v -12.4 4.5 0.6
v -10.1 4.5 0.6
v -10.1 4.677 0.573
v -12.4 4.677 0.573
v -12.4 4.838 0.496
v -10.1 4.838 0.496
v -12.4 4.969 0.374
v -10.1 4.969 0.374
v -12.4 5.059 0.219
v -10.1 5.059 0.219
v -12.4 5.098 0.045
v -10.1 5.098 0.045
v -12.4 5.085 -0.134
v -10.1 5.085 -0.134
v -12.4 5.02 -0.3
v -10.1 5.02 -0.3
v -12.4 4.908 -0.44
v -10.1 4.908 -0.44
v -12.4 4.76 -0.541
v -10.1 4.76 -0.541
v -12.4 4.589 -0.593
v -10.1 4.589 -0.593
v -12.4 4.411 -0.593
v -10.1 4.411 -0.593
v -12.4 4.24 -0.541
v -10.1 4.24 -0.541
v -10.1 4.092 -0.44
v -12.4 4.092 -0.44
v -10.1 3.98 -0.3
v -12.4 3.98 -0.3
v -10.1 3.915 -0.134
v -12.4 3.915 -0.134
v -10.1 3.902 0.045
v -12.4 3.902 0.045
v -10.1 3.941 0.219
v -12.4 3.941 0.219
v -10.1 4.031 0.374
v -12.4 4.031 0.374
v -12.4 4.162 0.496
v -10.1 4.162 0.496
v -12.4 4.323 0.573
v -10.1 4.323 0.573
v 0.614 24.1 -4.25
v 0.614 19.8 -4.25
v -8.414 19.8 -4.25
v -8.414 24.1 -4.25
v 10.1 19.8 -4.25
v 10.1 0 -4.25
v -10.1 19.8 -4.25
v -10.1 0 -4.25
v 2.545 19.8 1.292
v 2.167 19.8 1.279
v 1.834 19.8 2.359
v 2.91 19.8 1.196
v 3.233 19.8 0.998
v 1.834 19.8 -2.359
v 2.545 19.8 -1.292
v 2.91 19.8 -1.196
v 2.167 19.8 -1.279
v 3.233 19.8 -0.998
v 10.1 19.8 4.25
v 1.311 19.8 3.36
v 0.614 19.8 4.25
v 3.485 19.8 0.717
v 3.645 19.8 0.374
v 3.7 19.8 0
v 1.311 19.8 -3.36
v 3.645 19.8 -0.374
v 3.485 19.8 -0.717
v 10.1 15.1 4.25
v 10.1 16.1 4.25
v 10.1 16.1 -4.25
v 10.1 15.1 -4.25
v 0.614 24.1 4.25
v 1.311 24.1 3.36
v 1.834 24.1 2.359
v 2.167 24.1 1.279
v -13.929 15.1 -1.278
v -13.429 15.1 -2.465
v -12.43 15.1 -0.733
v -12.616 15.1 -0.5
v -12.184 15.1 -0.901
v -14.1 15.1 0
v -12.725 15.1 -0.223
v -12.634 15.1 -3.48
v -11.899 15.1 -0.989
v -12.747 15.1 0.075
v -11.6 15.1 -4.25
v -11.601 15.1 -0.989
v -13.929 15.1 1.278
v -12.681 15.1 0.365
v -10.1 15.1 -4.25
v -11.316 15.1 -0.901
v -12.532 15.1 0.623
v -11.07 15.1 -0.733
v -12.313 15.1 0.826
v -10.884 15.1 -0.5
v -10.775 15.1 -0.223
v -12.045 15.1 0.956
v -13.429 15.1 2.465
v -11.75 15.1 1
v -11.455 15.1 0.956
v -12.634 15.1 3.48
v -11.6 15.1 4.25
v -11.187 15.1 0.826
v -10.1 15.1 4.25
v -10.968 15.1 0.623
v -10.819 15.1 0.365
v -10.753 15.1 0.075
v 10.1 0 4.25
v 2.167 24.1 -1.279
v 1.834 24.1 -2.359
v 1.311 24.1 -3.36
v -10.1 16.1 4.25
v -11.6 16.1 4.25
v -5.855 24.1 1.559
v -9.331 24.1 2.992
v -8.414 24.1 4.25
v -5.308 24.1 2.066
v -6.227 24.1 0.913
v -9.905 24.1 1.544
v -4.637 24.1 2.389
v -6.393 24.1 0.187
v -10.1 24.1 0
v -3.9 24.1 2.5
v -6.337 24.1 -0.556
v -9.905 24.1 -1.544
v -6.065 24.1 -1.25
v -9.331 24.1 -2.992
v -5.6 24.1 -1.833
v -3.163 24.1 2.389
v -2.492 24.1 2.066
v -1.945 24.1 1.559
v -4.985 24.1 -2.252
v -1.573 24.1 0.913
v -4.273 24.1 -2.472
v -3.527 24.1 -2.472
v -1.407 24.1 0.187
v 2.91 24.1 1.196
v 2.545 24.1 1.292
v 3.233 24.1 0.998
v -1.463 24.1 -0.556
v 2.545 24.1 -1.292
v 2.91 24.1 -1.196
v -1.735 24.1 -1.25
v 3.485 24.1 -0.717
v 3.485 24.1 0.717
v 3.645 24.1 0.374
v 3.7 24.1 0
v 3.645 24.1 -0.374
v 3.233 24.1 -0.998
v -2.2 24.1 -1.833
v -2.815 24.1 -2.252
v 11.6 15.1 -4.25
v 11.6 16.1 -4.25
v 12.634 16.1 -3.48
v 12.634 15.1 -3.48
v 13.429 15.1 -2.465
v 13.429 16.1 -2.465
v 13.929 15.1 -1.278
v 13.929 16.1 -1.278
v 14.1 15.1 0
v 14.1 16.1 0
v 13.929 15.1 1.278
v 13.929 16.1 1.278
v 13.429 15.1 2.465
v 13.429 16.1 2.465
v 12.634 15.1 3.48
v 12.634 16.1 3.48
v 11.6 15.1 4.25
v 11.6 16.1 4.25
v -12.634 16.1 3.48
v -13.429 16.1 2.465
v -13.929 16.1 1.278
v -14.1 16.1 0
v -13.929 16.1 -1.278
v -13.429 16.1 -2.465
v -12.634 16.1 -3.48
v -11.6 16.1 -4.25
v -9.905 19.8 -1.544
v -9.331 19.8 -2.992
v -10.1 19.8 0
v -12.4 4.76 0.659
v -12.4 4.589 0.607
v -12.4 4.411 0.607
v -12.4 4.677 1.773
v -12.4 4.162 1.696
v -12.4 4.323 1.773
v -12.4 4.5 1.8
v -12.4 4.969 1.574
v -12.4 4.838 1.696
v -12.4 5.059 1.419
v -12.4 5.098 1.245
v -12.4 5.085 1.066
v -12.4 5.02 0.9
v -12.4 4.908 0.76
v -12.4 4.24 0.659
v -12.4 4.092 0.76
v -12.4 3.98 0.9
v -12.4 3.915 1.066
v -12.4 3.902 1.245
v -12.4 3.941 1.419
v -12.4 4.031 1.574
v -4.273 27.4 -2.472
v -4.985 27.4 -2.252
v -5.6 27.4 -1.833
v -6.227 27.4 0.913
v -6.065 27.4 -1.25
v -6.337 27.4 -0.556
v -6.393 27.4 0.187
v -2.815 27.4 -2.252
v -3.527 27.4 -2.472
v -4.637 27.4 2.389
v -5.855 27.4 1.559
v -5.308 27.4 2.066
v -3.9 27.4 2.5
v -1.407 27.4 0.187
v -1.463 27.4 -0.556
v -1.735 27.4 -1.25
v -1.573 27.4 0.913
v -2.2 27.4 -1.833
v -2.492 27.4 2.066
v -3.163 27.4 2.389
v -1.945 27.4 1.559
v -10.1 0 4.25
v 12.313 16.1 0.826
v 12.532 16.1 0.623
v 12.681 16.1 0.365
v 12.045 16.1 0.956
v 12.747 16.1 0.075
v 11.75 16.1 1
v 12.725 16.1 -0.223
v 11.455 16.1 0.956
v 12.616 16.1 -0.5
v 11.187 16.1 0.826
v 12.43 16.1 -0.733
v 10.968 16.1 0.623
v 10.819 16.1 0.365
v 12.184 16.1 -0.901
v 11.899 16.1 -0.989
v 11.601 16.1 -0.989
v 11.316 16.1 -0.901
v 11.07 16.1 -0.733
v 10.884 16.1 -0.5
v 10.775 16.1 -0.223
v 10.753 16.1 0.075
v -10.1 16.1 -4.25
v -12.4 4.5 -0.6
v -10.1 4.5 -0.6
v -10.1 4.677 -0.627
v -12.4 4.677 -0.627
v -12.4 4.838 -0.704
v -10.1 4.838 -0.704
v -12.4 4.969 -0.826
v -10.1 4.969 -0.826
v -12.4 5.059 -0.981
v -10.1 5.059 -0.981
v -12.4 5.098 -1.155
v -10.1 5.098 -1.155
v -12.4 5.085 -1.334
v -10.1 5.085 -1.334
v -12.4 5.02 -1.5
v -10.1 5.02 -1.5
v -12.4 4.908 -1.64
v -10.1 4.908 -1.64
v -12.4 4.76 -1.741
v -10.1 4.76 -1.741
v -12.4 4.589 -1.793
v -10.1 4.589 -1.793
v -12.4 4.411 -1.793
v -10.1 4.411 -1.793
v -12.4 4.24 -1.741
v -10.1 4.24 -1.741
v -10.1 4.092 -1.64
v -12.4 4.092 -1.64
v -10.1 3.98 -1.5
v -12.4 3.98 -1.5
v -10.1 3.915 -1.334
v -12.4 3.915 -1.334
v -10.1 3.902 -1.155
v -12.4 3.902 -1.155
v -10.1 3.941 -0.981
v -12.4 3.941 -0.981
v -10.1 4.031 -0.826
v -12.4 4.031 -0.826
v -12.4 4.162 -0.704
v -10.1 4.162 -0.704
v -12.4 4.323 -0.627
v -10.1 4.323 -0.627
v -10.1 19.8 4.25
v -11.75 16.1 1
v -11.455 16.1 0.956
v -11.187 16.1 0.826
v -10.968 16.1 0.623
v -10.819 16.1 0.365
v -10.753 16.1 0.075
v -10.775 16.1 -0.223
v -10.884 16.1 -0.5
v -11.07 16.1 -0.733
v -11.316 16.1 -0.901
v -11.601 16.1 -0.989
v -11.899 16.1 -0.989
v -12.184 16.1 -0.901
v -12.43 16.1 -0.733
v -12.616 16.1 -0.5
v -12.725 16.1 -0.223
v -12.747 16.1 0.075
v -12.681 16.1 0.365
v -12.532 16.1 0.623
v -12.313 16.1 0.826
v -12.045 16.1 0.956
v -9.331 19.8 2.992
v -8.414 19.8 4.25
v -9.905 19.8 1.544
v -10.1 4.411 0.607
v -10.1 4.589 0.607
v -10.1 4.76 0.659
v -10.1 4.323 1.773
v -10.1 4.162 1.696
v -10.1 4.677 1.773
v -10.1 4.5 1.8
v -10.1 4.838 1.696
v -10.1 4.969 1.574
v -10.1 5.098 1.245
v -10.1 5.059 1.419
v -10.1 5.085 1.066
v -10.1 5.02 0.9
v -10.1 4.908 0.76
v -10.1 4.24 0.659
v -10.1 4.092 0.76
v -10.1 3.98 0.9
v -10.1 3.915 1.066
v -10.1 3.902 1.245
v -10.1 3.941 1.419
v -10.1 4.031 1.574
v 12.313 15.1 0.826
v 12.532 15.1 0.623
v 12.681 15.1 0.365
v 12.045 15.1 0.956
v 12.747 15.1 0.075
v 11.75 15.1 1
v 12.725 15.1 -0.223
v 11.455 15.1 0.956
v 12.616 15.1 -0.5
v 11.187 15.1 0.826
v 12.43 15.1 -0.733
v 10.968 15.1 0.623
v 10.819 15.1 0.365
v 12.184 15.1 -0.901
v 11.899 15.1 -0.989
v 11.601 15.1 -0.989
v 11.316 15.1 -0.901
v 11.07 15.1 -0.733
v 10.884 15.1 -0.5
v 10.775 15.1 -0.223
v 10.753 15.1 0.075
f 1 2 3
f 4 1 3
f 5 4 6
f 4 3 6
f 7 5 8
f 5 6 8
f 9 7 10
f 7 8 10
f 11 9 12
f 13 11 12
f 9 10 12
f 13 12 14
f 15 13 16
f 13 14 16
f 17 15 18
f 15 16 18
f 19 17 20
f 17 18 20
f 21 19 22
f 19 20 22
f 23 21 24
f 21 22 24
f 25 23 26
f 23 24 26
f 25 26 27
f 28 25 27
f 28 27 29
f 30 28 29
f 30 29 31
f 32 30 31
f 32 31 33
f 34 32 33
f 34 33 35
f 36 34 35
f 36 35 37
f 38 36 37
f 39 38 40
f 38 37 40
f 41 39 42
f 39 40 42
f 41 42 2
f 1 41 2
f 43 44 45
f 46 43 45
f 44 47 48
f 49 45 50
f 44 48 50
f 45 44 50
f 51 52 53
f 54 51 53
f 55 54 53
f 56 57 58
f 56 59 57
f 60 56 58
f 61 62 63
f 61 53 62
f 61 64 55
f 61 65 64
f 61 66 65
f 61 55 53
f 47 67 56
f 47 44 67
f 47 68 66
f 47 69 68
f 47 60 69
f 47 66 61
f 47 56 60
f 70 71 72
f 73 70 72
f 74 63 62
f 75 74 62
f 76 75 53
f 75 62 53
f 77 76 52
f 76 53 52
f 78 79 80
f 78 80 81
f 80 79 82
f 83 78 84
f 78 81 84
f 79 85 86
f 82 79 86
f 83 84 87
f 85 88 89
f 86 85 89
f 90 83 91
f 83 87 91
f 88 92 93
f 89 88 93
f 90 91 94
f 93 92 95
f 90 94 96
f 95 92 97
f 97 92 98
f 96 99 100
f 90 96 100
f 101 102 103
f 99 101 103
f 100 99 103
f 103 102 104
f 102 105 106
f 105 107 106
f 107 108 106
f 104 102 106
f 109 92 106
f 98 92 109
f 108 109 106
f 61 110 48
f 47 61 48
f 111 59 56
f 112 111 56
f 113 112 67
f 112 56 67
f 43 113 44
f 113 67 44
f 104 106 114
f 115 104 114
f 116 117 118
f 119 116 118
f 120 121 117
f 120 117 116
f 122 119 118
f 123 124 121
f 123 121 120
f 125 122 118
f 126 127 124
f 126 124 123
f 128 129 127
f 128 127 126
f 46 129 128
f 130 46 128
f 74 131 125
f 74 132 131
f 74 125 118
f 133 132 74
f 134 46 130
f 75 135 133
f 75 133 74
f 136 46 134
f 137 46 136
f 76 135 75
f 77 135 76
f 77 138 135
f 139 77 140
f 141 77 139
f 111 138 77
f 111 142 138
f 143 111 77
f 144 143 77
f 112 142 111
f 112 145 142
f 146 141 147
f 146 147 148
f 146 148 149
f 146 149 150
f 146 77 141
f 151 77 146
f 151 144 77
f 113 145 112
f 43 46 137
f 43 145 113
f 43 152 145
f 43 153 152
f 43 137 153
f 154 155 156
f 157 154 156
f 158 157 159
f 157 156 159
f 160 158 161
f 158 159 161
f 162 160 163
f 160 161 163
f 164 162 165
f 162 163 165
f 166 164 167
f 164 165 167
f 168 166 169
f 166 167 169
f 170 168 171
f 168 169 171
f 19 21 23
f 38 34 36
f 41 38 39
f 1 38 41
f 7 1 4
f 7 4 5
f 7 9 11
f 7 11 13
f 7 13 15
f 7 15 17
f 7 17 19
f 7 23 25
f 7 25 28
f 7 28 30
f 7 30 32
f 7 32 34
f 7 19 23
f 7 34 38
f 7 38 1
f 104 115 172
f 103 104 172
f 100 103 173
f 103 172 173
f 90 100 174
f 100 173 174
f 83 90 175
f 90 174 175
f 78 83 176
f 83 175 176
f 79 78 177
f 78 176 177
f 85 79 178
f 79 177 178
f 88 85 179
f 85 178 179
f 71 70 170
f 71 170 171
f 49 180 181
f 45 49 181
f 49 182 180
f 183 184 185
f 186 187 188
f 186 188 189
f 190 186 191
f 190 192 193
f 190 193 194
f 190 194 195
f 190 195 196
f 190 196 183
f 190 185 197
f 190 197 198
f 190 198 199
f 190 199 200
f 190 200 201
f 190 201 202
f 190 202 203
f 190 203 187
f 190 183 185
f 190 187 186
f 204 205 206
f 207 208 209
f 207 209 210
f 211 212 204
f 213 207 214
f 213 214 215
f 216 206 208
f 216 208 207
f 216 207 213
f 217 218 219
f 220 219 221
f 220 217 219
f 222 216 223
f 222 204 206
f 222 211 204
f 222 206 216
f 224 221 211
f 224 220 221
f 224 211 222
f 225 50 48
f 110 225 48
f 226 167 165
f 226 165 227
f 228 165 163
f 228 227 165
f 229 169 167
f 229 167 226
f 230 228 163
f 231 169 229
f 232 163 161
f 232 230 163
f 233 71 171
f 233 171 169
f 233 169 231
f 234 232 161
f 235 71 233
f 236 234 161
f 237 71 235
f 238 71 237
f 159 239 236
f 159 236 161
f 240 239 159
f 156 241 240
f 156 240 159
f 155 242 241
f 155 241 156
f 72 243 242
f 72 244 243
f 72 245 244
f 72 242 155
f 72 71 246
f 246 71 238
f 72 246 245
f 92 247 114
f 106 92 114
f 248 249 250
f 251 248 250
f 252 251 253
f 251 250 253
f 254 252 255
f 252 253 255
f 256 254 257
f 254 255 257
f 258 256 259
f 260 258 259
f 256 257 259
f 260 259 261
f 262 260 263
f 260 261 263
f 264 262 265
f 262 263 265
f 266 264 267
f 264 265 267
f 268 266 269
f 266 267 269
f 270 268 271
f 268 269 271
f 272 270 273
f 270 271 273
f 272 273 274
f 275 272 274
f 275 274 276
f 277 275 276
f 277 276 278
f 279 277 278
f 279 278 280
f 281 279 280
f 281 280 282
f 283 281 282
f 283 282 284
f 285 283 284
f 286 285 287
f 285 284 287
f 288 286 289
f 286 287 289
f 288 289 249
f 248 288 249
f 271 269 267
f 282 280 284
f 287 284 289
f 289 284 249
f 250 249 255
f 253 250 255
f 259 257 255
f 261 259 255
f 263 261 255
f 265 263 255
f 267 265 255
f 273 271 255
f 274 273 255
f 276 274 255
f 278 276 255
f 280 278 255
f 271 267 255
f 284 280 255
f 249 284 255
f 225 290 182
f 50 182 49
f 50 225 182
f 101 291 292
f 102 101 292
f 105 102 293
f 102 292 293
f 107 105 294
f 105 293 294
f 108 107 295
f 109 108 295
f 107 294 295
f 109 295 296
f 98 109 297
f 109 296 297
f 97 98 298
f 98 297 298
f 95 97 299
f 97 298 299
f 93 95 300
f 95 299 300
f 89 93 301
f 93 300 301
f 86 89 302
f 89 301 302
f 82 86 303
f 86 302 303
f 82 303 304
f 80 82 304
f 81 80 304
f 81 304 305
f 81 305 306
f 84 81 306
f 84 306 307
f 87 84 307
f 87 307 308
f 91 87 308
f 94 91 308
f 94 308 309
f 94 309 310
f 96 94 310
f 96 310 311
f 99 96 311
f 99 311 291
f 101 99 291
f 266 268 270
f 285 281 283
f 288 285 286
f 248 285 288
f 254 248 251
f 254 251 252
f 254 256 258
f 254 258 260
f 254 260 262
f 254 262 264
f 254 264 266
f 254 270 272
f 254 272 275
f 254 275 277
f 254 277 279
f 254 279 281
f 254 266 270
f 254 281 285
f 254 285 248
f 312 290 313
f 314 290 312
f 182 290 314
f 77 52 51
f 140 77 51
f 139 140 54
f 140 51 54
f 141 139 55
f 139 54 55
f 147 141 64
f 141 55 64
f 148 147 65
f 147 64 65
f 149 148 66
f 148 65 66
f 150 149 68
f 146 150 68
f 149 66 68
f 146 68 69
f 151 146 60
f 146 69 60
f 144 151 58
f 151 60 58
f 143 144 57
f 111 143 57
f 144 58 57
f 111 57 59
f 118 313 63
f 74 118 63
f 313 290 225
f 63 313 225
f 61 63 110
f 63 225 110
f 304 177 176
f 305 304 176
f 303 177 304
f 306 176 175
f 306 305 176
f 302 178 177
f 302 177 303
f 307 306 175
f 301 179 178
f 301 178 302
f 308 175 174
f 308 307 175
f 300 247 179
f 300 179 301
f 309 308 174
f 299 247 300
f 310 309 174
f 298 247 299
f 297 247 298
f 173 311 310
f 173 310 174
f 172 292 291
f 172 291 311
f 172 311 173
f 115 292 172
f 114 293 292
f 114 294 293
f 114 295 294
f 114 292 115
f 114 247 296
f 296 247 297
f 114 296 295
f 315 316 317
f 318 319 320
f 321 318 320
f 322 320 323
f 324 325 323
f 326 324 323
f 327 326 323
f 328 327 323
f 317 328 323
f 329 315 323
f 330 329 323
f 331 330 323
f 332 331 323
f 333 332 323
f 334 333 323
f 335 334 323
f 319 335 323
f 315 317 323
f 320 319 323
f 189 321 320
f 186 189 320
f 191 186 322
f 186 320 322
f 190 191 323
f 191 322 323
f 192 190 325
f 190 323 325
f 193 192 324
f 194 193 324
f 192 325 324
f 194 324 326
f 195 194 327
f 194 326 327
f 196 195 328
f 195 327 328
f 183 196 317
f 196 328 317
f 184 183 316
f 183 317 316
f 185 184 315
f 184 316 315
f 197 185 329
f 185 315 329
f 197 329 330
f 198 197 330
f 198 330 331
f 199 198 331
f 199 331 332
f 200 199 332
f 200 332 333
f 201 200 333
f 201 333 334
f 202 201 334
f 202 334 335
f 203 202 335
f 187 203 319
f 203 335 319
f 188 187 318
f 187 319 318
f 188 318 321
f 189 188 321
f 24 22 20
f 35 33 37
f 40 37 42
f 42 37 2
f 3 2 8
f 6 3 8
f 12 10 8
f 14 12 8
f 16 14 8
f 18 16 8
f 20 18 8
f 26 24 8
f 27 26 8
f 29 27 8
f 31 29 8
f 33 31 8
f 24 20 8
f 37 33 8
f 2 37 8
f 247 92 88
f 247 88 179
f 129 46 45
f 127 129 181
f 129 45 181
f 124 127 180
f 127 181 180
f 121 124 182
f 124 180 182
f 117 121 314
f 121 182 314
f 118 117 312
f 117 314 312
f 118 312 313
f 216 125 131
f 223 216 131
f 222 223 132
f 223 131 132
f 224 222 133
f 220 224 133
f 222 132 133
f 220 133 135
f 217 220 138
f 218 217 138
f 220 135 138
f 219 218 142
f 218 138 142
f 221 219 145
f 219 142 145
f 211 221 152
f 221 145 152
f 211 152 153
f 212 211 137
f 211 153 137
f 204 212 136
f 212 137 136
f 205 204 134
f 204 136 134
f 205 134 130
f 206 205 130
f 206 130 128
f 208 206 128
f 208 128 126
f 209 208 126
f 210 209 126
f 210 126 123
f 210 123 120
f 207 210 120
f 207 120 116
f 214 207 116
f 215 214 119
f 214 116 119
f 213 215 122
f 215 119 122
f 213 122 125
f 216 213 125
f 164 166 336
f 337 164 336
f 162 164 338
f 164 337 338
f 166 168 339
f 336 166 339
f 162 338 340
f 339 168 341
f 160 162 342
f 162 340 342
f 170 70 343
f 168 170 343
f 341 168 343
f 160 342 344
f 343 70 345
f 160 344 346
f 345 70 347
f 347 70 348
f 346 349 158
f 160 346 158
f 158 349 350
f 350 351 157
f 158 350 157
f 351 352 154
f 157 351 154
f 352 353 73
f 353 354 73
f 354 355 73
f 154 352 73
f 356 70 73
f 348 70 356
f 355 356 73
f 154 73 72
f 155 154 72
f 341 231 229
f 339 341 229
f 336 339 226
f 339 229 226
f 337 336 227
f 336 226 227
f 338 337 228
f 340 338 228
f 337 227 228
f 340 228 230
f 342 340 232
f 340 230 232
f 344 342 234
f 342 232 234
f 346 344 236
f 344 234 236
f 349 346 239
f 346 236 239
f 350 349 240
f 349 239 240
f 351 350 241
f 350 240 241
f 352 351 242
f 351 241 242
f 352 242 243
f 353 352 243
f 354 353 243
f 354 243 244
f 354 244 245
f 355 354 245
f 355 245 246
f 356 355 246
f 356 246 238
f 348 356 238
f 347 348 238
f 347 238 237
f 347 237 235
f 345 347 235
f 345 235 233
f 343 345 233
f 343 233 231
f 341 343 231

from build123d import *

# Parameters (mm, degrees)
SKETCH1_W                  = 20.2
SKETCH1_H                  = 8.5
BOSS_EXTRUDE1_DEPTH        = 19.8
SKETCH2_W                  = 8.5
SKETCH2_H                  = 1
BOSS_EXTRUDE2_DEPTH        = 5
SKETCH3_W                  = 8.5
SKETCH3_H                  = 1
BOSS_EXTRUDE3_DEPTH        = 5
SKETCH4_R                  = 1
CUT_EXTRUDE1_DEPTH         = 2.5
BOSS_EXTRUDE4_DEPTH        = 4.3
SKETCH7_R                  = 2.5
BOSS_EXTRUDE5_DEPTH        = 3.3
SKETCH8_R                  = 0.6
BOSS_EXTRUDE7_DEPTH        = 2.3
BOSS_EXTRUDE7_2_DEPTH      = 2.3
BOSS_EXTRUDE7_3_DEPTH      = 2.3
WYTNIJ_WYCI_GNI_CIE1_DEPTH = 23.478489718
SKETCH4_5_R                = 1
WYTNIJ_WYCI_GNI_CIE2_DEPTH = 22.819314838


# Read off the part's stored shape, not the designer's step: Boss-Extrude4
with BuildPart() as part:
    # Sketch1 → Boss-Extrude1 (new body)
    with BuildSketch(Plane(origin=(0, 0, 0), x_dir=(1, 0, 0), z_dir=(0, 1, 0))):
        Rectangle(SKETCH1_W, SKETCH1_H)
    extrude(amount=BOSS_EXTRUDE1_DEPTH)

    # Boss-Extrude4 outline → Boss-Extrude4 (add)
    with BuildSketch(Plane(origin=(0, 19.8, 0), x_dir=(1, 0, 0), z_dir=(0, 1, 0))):
        with BuildLine():
            Line((0.614144437, 4.25), (-8.414144437, 4.25))
            ThreePointArc((-8.414144437, 4.25), (-10.1, 0), (-8.414144437, -4.25))
            Line((-8.414144437, -4.25), (0.614144437, -4.25))
            ThreePointArc((0.614144437, -4.25), (1.595022014, -2.871364322), (2.166666667, -1.278888406))
            ThreePointArc((2.166666667, -1.278888406), (3.7, 0), (2.166666667, 1.278888406))
            ThreePointArc((2.166666667, 1.278888406), (1.595022014, 2.871364322), (0.614144437, 4.25))
        make_face()
    extrude(amount=BOSS_EXTRUDE4_DEPTH)

    # Sketch7 → Boss-Extrude5 (add)
    with BuildSketch(Plane(origin=(0, 24.1, 0), x_dir=(1, 0, 0), z_dir=(0, 1, 0))):
        with Locations(Location((-3.9, 0, 0), (0, 0, 270))):
            Circle(SKETCH7_R)
    extrude(amount=BOSS_EXTRUDE5_DEPTH)


with BuildPart() as body_2:
    # Sketch2 → Boss-Extrude2 (new body)
    with BuildSketch(Plane(origin=(10.1, 0, 0), x_dir=(0, 0, -1), z_dir=(1, 0, 0))):
        with Locations((0, 15.6)):
            Rectangle(SKETCH2_W, SKETCH2_H)
    extrude(amount=BOSS_EXTRUDE2_DEPTH)

    # Sketch4<4> → Wytnij-wyciągnięcie1 (cut, through all)
    with BuildSketch(Plane(origin=(0, 16.1, 0), x_dir=(1, 0, 0), z_dir=(0, 1, 0))):
        with BuildLine():
            Line((15.1, 4.25), (11.6, 4.25))
            ThreePointArc((11.6, 4.25), (14.1, 0), (11.6, -4.25))
            Line((11.6, -4.25), (15.1, -4.25))
            Line((15.1, -4.25), (15.1, 4.25))
        make_face()
    extrude(amount=-WYTNIJ_WYCI_GNI_CIE1_DEPTH, mode=Mode.SUBTRACT)

    # Sketch4<5> → Wytnij-wyciągnięcie2 (cut, through all)
    with BuildSketch(Plane(origin=(0, 16.1, 0), x_dir=(1, 0, 0), z_dir=(0, 1, 0))):
        with Locations(Location((11.75, 0, 0), (0, 0, 270))):
            Circle(SKETCH4_5_R)
    extrude(amount=-WYTNIJ_WYCI_GNI_CIE2_DEPTH, mode=Mode.SUBTRACT)


with BuildPart() as body_3:
    # Sketch3 → Boss-Extrude3 (new body)
    with BuildSketch(Plane.ZY.offset(10.1)):
        with Locations((0, 15.6)):
            Rectangle(SKETCH3_W, SKETCH3_H)
    extrude(amount=BOSS_EXTRUDE3_DEPTH)

    # Sketch4 → Cut-Extrude1 (cut)
    with BuildSketch(Plane(origin=(0, 16.1, 0), x_dir=(1, 0, 0), z_dir=(0, 1, 0))):
        with BuildLine():
            ThreePointArc((-11.6, -4.25), (-14.1, 0), (-11.6, 4.25))
            Line((-11.6, 4.25), (-15.1, 4.25))
            Line((-15.1, 4.25), (-15.1, -4.25))
            Line((-15.1, -4.25), (-11.6, -4.25))
        make_face()
        with Locations(Location((-11.75, 0, 0), (0, 0, 270))):
            Circle(SKETCH4_R)
    extrude(amount=-CUT_EXTRUDE1_DEPTH, mode=Mode.SUBTRACT)


with BuildPart() as body_4:
    # Sketch8 → Boss-Extrude7 (new body)
    with BuildSketch(Plane.ZY.offset(10.1)):
        with Locations((0, 4.5)):
            Circle(SKETCH8_R)
    extrude(amount=BOSS_EXTRUDE7_DEPTH)


with BuildPart() as body_5:
    # Sketch8 → Boss-Extrude7 2 (new body)
    with BuildSketch(Plane.ZY.offset(10.1)):
        with Locations((-1.2, 4.5)):
            Circle(SKETCH8_R)
    extrude(amount=BOSS_EXTRUDE7_2_DEPTH)


with BuildPart() as body_6:
    # Sketch8 → Boss-Extrude7 3 (new body)
    with BuildSketch(Plane.ZY.offset(10.1)):
        with Locations((1.2, 4.5)):
            Circle(SKETCH8_R)
    extrude(amount=BOSS_EXTRUDE7_3_DEPTH)


solid = Compound([part.part, body_2.part, body_3.part, body_4.part, body_5.part, body_6.part])
